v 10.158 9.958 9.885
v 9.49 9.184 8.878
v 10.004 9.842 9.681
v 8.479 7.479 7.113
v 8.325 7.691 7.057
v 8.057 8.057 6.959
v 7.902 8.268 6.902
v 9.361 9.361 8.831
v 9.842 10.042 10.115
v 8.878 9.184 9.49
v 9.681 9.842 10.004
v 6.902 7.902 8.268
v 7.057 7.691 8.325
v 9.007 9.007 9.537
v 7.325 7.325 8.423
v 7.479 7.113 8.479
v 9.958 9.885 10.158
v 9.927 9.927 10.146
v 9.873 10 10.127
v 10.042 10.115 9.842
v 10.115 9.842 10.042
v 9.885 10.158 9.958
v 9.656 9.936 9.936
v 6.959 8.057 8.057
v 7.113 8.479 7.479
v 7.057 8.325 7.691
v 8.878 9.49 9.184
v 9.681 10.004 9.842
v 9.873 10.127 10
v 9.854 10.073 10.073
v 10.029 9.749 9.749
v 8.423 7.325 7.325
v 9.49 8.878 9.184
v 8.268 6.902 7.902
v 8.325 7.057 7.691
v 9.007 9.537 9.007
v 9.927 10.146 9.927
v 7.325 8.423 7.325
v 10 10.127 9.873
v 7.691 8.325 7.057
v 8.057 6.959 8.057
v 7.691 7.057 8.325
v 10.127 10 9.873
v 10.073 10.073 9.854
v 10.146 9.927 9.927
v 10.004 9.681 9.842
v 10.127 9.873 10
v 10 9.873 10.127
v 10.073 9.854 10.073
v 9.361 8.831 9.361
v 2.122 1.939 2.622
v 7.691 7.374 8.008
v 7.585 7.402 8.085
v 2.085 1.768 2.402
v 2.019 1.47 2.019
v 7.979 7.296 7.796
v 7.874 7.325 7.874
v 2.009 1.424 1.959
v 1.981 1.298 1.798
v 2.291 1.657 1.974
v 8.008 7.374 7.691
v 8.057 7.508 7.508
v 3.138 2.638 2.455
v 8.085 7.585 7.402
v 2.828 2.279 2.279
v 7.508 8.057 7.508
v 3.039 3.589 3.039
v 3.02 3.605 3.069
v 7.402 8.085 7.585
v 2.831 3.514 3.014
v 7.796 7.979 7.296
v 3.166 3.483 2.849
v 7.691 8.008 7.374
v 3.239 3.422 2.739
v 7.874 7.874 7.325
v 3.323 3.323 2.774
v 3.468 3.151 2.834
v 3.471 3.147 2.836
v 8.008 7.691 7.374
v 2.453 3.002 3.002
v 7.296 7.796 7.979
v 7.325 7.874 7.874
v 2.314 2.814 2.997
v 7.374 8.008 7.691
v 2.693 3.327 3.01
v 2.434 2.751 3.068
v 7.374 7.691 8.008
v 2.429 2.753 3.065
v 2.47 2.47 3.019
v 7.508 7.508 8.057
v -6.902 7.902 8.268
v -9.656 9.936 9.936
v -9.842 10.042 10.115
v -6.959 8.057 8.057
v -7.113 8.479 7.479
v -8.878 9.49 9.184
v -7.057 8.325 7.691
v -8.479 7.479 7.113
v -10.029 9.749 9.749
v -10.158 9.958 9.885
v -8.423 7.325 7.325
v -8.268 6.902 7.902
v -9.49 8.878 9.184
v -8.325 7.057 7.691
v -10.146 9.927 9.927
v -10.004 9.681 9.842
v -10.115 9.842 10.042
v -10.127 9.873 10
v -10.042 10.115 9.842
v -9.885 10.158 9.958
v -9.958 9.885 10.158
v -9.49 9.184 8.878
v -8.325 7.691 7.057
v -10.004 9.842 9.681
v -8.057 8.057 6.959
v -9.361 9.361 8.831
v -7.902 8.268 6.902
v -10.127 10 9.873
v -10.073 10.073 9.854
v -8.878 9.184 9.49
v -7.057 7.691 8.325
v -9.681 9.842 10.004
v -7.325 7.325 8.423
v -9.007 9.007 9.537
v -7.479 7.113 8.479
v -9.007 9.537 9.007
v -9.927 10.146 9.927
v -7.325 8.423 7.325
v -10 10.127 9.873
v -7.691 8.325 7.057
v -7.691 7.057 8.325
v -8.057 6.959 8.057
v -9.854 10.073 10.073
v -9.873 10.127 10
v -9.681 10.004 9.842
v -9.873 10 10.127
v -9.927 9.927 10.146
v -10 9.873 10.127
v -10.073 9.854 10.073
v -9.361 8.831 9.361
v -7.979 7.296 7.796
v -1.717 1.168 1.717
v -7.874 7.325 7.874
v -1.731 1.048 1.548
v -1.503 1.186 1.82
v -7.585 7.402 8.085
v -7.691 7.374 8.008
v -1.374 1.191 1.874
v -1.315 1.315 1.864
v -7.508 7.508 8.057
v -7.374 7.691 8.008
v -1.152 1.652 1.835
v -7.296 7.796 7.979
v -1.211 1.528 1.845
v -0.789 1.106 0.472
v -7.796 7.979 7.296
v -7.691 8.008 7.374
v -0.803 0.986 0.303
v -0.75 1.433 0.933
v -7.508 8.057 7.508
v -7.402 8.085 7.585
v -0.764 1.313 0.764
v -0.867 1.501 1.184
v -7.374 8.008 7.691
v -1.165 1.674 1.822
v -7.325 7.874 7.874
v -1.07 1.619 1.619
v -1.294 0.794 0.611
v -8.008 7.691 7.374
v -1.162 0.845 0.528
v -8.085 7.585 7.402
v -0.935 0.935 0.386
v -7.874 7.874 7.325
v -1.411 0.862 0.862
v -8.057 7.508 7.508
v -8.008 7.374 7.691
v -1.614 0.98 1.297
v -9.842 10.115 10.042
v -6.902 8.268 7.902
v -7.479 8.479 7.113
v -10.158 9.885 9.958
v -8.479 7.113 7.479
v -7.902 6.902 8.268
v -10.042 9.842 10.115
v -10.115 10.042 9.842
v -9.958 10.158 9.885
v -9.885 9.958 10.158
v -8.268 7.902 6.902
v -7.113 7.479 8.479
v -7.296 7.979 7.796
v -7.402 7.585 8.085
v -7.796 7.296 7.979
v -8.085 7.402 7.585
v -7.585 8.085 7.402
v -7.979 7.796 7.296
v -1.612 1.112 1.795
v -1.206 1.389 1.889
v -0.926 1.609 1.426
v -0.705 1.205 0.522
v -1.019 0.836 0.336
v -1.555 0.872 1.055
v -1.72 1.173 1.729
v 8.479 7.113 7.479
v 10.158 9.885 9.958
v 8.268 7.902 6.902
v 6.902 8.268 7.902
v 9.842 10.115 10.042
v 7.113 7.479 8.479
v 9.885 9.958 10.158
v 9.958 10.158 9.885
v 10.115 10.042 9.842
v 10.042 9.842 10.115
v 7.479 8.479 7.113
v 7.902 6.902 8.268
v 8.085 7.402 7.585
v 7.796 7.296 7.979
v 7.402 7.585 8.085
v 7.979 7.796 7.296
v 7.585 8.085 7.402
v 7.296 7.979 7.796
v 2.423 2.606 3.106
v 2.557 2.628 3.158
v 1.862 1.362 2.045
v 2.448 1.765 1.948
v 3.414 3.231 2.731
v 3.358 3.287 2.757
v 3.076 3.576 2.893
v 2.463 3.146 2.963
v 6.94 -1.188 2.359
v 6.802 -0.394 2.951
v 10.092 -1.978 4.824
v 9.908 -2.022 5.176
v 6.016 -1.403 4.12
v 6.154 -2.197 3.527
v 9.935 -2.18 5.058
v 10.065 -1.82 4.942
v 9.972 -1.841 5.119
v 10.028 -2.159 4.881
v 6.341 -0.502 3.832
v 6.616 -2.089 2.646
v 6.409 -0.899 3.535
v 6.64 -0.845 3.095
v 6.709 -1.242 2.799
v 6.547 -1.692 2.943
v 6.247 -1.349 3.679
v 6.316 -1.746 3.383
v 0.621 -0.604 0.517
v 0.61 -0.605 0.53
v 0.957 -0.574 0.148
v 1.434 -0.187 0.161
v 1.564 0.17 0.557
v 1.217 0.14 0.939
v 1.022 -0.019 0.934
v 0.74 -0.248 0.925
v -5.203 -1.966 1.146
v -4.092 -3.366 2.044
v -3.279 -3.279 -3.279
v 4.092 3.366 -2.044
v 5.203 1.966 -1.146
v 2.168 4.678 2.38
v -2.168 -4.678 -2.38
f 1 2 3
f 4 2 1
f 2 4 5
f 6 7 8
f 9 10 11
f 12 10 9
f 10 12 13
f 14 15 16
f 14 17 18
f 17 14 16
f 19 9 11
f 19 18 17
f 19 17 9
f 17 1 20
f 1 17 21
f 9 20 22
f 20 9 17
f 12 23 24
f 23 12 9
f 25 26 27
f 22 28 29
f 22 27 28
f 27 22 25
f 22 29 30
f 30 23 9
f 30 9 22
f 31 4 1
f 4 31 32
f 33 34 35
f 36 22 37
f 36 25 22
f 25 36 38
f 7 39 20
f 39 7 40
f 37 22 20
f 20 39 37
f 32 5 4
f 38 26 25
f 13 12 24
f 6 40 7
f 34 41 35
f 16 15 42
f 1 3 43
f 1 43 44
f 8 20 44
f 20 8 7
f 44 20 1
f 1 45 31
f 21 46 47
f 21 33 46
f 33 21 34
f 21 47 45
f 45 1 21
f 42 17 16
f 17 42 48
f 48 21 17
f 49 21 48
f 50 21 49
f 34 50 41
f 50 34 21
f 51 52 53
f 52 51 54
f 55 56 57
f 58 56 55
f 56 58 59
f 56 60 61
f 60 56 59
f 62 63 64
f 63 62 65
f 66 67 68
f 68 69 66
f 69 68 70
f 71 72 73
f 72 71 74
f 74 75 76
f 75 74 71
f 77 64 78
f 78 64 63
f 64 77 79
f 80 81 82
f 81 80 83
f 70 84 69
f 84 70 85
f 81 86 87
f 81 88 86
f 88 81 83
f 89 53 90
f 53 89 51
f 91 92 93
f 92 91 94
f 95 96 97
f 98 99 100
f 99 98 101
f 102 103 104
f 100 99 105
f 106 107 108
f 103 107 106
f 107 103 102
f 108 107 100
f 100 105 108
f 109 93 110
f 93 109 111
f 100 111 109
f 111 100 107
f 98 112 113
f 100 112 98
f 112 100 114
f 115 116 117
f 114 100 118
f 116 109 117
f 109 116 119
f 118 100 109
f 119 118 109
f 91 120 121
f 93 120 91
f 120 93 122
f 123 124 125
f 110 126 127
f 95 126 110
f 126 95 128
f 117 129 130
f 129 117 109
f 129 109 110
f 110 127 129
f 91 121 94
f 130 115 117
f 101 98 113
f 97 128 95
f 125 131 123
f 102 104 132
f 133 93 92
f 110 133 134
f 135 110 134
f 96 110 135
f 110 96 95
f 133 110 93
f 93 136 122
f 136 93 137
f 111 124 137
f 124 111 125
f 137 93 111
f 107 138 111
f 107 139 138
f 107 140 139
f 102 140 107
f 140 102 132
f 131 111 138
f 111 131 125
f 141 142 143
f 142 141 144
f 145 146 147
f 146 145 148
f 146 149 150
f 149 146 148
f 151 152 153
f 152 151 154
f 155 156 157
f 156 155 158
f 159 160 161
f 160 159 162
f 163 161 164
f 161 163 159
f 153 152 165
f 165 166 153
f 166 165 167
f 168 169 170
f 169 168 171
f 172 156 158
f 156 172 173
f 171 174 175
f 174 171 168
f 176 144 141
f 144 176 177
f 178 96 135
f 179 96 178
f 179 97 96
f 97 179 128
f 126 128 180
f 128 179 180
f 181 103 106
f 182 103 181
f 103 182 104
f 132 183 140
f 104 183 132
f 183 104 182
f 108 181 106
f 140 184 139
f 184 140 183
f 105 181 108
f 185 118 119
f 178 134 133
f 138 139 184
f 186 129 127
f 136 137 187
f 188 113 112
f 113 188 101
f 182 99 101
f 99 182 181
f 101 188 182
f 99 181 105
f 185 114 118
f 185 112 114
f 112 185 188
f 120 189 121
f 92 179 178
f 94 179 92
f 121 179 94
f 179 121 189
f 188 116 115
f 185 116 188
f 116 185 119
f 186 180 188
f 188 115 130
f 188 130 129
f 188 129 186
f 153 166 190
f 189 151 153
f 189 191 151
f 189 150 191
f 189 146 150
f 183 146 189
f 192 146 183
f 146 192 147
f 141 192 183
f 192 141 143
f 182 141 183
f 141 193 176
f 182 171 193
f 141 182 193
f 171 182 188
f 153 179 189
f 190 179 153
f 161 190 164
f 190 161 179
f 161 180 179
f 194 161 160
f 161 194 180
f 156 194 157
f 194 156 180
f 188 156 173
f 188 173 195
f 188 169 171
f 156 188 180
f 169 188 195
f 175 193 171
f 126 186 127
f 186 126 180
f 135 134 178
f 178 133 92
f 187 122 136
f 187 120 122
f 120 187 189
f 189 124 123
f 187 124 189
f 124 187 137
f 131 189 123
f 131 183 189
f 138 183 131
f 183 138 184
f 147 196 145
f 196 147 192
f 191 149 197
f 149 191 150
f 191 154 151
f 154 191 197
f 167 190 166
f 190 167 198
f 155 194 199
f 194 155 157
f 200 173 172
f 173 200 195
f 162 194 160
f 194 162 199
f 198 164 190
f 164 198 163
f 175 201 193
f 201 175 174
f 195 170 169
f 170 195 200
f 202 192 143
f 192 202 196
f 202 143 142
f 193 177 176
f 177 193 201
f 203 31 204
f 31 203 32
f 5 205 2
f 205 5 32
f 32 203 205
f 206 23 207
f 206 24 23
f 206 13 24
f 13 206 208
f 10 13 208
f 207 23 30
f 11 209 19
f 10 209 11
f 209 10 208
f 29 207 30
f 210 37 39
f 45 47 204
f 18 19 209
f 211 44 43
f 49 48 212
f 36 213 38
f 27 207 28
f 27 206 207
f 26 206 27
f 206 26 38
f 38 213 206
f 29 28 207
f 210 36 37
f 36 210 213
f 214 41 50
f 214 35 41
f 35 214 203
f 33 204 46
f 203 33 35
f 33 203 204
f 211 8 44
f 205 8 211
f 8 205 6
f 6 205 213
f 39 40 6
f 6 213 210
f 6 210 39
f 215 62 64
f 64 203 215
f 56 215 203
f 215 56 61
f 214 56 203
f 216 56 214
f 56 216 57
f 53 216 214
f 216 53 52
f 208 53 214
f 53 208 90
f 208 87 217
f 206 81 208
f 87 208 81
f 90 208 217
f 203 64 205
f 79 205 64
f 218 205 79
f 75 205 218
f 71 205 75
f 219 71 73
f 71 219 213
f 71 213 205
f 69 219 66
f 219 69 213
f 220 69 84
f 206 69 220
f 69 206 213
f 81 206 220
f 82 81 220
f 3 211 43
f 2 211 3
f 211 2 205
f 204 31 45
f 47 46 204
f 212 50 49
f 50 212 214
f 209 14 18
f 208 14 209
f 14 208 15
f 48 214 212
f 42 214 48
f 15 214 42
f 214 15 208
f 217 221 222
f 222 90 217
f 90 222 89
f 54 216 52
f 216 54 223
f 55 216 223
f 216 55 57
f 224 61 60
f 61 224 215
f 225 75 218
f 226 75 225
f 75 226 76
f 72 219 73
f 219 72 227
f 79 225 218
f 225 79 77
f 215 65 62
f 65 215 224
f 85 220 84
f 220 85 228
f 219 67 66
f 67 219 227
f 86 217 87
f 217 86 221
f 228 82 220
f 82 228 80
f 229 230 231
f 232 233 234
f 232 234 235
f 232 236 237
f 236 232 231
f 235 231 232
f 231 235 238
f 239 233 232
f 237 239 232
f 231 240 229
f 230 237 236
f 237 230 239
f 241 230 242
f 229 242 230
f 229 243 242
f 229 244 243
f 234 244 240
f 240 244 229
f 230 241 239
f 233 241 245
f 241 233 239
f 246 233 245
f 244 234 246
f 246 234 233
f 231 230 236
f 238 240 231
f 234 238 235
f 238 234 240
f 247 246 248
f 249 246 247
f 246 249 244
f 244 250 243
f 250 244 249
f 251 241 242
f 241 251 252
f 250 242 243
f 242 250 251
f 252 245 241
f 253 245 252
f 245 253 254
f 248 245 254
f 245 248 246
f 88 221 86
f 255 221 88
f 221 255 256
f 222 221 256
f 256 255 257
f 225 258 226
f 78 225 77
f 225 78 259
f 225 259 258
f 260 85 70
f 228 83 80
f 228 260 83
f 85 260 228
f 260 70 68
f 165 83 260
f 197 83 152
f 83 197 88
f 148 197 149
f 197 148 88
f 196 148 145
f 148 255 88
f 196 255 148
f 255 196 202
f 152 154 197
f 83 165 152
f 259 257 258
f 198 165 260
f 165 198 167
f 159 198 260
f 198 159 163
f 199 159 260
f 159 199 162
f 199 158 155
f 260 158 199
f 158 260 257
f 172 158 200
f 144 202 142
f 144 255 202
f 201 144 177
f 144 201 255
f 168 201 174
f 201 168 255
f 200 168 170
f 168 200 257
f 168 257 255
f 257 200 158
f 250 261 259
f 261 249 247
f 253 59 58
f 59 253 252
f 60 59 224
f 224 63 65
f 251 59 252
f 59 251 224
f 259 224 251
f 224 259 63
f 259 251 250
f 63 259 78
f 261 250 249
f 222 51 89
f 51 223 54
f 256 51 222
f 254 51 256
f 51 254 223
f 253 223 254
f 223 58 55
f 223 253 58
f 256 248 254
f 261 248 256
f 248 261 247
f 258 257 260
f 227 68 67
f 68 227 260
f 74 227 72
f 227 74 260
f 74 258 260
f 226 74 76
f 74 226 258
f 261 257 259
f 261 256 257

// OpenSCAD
//---------------------------------------------------------------
//-- Openscad vector library
//-- This is a component of the obiscad opescad tools by Obijuan
//-- (C) Juan Gonzalez-Gomez (Obijuan)
//-- Sep-2012
//---------------------------------------------------------------
//-- Released under the GPL license
//---------------------------------------------------------------

obiscad_drawing_resolution = 6;

//----------------------------------------
//-- FUNCTIONS FOR WORKING WITH VECTORS
//----------------------------------------

//-- Calculate the module of a vector
function mod(v) = (sqrt(v[0]*v[0]+v[1]*v[1]+v[2]*v[2]));

//-- Calculate the cros product of two vectors
function cross(u,v) = [
  u[1]*v[2] - v[1]*u[2],
  -(u[0]*v[2] - v[0]*u[2]) ,
  u[0]*v[1] - v[0]*u[1]];

//-- Calculate the dot product of two vectors
function dot(u,v) = u[0]*v[0]+u[1]*v[1]+u[2]*v[2];

//-- Return the unit vector of a vector
function unitv(v) = v/mod(v);

//-- Return the angle between two vectores
function anglev(u,v) = acos( dot(u,v) / (mod(u)*mod(v)) );

//----------------------------------------------------------
//--  Draw a point in the position given by the vector p  
//----------------------------------------------------------
module point(p)
{
  translate(p)
    sphere(r=0.7,$fn=obiscad_drawing_resolution);
}

//------------------------------------------------------------------
//-- Draw a vector poiting to the z axis
//-- This is an auxiliary module for implementing the vector module
//--
//-- Parameters:
//--  l: total vector length (line + arrow)
//--  l_arrow: Vector arrow length
//--  mark: If true, a mark is draw in the vector head, for having
//--    a visual reference of the rolling angle
//------------------------------------------------------------------
module vectorz(l=10, l_arrow=4, mark=false)
{
  //-- vector body length (not including the arrow)
  lb = l - l_arrow;

  //-- The vector is locatead at 0,0,0
  translate([0,0,lb/2])
  union() {

    //-- Draw the arrow
    translate([0,0,lb/2])
      cylinder(r1=2/2, r2=0.2, h=l_arrow, $fn=obiscad_drawing_resolution);

    //-- Draw the mark
    if (mark) {
      translate([0,0,lb/2+l_arrow/2])
      translate([1,0,0])
        cube([2,0.3,l_arrow*0.8],center=true);
    }

    //-- Draw the body
    cylinder(r=1/2, h=lb, center=true, $fn=obiscad_drawing_resolution);
  }

  //-- Draw a sphere in the vector base
  sphere(r=1/2, $fn=obiscad_drawing_resolution);
}

//-----------------------------------------------------------------
//-- ORIENTATE OPERATOR
//--
//--  Orientate an object to the direction given by the vector v
//--  Parameters:
//--    v : Target orientation
//--    vref: Vector reference. It is the vector of the local frame
//--          of the object that want to be poiting in the direction
//--          of v
//--    roll: Rotation of the object around the v axis
//-------------------------------------------------------------------
module orientate(v,vref=[0,0,1], roll=0)
{
  //-- Calculate the rotation axis
  raxis = cross(vref,v);
  
  //-- Calculate the angle between the vectors
  ang = anglev(vref,v);

  //-- Rotate the child!
  rotate(a=roll, v=v)
    rotate(a=ang, v=raxis)
      children(0);
}

//---------------------------------------------------------------------------
//-- Draw a vector 
//--
//-- There are two modes of drawing the vector
//-- * Mode 1: Given by a cartesian point(x,y,z). A vector from the origin
//--           to the end (x,y,z) is drawn. The l parameter (length) must 
//--           be 0  (l=0)
//-- * Mode 2: Give by direction and length
//--           A vector of length l pointing to the direction given by
//--           v is drawn
//---------------------------------------------------------------------------
//-- Parameters:
//--  v: Vector cartesian coordinates
//--  l: total vector length (line + arrow)
//--  l_arrow: Vector arrow length
//    mark: If true, a mark is draw in the vector head, for having
//--    a visual reference of the rolling angle
//---------------------------------------------------------------------------
module vector(v,l=0, l_arrow=4, mark=false)
{
  //-- Get the vector length from the coordinates
  mod = mod(v);

  //-- The vector is very easy implemented by means of the orientate
  //-- operator:
  //--  orientate(v) vectorz(l=mod, l_arrow=l_arrow)
  //--  BUT... in OPENSCAD 2012.02.22 the recursion does not
  //--    not work, so that if the user use the orientate operator
  //--    on a vector, openscad will ignore it..
  //-- The solution at the moment (I hope the openscad developers
  //--  implement the recursion in the near future...)
  //--  is to repite the orientate operation in this module

  //---- SAME CALCULATIONS THAN THE ORIENTATE OPERATOR!
  //-- Calculate the rotation axis

  vref = [0,0,1];
  raxis = cross(vref,v);
  
  //-- Calculate the angle between the vectors
  ang = anglev(vref,v);

  //-- orientate the vector
  //-- Draw the vector. The vector length is given either
  //--- by the mod variable (when l=0) or by l (when l!=0)
  if (l==0)
    rotate(a=ang, v=raxis)
      vectorz(l=mod, l_arrow=l_arrow, mark=mark);
  else
    rotate(a=ang, v=raxis)
      vectorz(l=l, l_arrow=l_arrow, mark=mark);

}

//----------------------------------------------------
//-- Draw a Frame of reference
//-- Parameters:
//-- l: length of the Unit vectors
//-----------------------------------------------------
module frame(l=10, l_arrow=4)
{

  //-- Z unit vector
  color("Blue")
    vector([0,0,l], l_arrow=l_arrow);

  //-- X unit vector
  color("Red")
    vector([l,0,0], l_arrow=l_arrow );

  //-- Y unit vector
  color("Green")
    vector([0,l,0],l_arrow=l_arrow);

  //-- Origin
  color("Gray")
    sphere(r=1, $fn=obiscad_drawing_resolution);
}

//--------------------------------------------------
//-- Modules for testings and examples
//-- Testing that the vector library is working ok
//--------------------------------------------------

//-- 22 vectors in total are drawn, poiting to different directions
module Test_vectors1()
{

  a = 20;
  k = 1;

  //--  Add a frame of reference (in the origin)
  frame(l=a);

  //-- Negative vectors, pointing towards the three axis: -x, -y, -z
  color("Red")   vector([-a, 0,  0]);
  color("Green") vector([0, -a,  0]);
  color("Blue")  vector([0,  0, -a]);

  //-- It is *not* has been implemented using a for loop on purpose
  //-- This way, individual vectors can be commented out or highlighted

  //-- vectors with positive z
  vector([a,   a, a*k]);
  vector([0,   a, a*k]);
  vector([-a,  a, a*k]);
  vector([-a,  0, a*k]);

  vector([-a, -a, a*k]);
  vector([0,  -a, a*k]);
  vector([a,  -a, a*k]);
  vector([a,   0, a*k]);


  //-- Vectors with negative z
  vector([a,   a, -a*k]);
  vector([0,   a, -a*k]);
  vector([-a,  a, -a*k]);
  vector([-a,  0, -a*k]);

  vector([-a, -a, -a*k]);
  vector([0,  -a, -a*k]);
  vector([a,  -a, -a*k]);
  vector([a,   0, -a*k]);
}

//--- Another test...
module Test_vectors2()
{

  //-- Add the vector into the vector table
  //-- This vectors are taken as directions
  //-- All the vectors will be drawn with the same length (l)
  vector_table = [
    [1,   1, 1],
    [0,   1, 1],
    [-1,  1, 1],
    [-1,  0, 1],
    [-1, -1, 1],
    [0,  -1, 1],
    [1,  -1, 1],
    [1,   0, 1],
  
    [1,   1, -1],
    [0,   1, -1],
    [-1,  1, -1],
    [-1,  0, -1],
    [-1, -1, -1],
    [0,  -1, -1],
    [1,  -1, -1],
    [1,   0, -1],
  ];

  //-- Vector length
  l=20;

  frame(l=10);

  //-- Draw all the vector given in the table
  //-- The vectors point to the direction given in the table
  //-- They all are drawn with a length equal to l
  for (v=vector_table) {
    //-- Vector given by direction and length
    vector(v,l=l);
  }
}


//-- Test the cross product and the angle
//-- between vectors
module Test_vector3()
{
  //-- Start with 2 unit vectors
  v=unitv([1,1,1]);
  u=unitv([0,1,0]);

  //-- Draw the vector in different colors
  //-- Increase the length for drawing
  color("Red") vector(v*20);
  color("blue") vector(u*20);

  //-- Get the cross product
  w = cross(v,u);
  vector(w*20);

  //-- The cross product is NOT conmutative... 
  //-- change the order of v and u
  w2 = cross(u,v);
  vector(w2*20);

  //-- w should be perpendicular to v and u
  //-- Calculate the angles between them:
  echo("U , V: ", anglev(u,v));
  echo("W , U: ", anglev(w,u));
  echo("W , V: ", anglev(w,v));

}

//-- Test the orientate operator
module Test_vector4()
{
  o = [10,10,10];
  v = [-10,10,10];

  color("Red") vector(o);
  color("Blue") vector(v);

  //-- Orientate the vector o in the direction of v
  orientate(v,o)
    vector(o);

  //-- Inverse operation: orientate the v vector in the direction
  //-- of o
  orientate(o,v)
    vector(v);

  //-- Example of orientation of a cube
  orientate(o,vref=[10,-2,5],roll=0)
    cube([10,2,5],center=true);

  vector([10,-2,5]);

}

//-------- Perform tests......

Test_vector4();


/*

Test_vectors1();


translate([60,0,0]) 
  Test_vectors2();
*/
